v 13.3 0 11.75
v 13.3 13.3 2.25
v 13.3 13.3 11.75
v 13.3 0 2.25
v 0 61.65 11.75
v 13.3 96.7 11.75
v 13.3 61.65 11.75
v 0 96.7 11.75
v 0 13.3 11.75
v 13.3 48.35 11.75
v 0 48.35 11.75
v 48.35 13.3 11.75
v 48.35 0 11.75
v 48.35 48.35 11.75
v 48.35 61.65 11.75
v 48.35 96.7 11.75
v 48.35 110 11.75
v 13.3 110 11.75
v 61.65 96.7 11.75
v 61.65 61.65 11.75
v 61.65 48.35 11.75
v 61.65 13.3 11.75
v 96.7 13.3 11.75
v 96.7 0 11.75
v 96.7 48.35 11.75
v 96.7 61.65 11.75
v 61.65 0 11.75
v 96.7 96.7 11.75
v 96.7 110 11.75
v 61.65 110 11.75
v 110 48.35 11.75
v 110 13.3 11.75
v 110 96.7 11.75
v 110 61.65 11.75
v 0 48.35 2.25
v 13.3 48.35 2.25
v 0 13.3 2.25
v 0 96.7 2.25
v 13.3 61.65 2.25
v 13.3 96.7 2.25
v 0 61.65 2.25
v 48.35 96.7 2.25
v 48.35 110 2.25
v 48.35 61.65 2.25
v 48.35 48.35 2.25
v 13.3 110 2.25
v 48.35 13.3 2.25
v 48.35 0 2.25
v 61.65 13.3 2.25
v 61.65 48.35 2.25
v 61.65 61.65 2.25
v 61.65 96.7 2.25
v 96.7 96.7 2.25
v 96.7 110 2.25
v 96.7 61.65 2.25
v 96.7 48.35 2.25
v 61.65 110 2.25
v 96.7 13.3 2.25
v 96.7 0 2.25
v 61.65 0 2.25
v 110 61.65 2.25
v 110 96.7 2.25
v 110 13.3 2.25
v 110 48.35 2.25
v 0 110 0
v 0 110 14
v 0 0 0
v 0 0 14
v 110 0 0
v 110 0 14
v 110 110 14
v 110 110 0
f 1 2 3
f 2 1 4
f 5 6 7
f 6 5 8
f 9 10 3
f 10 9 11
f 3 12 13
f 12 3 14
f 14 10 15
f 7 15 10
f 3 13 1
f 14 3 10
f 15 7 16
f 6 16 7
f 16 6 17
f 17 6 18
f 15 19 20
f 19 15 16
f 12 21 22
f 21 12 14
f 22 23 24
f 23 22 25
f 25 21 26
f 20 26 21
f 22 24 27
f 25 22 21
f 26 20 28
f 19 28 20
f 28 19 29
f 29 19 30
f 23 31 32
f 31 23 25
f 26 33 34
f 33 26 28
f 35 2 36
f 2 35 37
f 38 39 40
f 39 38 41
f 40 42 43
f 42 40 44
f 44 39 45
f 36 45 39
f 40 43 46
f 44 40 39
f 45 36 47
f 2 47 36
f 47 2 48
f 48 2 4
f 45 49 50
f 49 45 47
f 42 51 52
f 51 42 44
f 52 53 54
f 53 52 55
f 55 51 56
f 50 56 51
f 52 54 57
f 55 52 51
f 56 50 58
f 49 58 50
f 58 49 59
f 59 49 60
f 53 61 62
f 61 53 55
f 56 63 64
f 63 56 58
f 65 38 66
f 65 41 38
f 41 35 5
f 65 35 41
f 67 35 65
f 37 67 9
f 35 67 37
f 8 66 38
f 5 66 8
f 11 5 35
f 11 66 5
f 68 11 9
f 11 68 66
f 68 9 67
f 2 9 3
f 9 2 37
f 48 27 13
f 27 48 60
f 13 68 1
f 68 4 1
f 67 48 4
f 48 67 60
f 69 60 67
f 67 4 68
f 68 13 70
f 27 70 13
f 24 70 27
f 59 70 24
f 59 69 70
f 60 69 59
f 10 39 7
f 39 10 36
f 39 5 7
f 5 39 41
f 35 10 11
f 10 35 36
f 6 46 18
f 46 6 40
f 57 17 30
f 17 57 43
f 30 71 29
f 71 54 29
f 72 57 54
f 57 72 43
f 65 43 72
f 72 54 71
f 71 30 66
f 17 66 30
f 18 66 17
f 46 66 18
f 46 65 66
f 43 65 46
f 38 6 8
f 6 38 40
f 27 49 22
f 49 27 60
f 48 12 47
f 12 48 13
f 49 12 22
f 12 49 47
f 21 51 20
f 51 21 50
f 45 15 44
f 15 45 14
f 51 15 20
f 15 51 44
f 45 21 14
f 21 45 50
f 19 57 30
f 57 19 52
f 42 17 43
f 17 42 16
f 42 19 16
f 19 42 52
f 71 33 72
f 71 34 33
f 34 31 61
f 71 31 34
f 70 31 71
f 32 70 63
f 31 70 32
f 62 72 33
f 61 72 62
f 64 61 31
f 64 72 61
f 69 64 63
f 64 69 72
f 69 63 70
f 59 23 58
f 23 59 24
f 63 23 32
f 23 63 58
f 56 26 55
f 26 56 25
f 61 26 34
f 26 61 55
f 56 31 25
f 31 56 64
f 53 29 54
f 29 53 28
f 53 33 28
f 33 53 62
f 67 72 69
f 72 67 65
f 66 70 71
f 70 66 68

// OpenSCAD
// 미니어처 T-11 파렛트 — 실물 치수 1/10 (faithful scale)
// 포크가 1/10 실물 파렛트 기준으로 설계됨 → 실물을 그대로 축소.
// 단위 mm. OpenSCAD F6(렌더) 후 F7(Export STL).
//
// ✅ 2026-07-29 실측 반영. 이전 기본값(높이 120·블록 140)은 미검증 표준 근사치였고
//    실물과 달랐다 — 그대로 재출력하면 개구부가 7.6mm로 나와 실물(9.5mm)과 어긋난다.

k = 10;   // 축척비

/* ===== 실물 파렛트 치수(mm) — 2026-07-29 실측 반영 ===== */
R_foot_x   = 1100;   // 가로
R_foot_y   = 1100;   // 세로
R_height   = 140;    // 전체 높이 (미니 14mm 실측)
R_top_deck = 22.5;   // 상판 두께  ┐ 합 45mm는 (높이 140 − 개구 95)에서 역산.
R_bot_deck = 22.5;   // 하판 두께  ┘ 상·하 분배는 실측하지 않아 균등 가정.
R_block    = 133;    // 다리 블록 한 변 — 개구 폭 35mm·중심 간격 48.3mm에서 역산(직접 실측 아님)
/* ===================================================== */

/* ===== 미니어처 지게차 포크 실측(mm) — fit 검증용 ===== */
F_thick = 5;      // 포크 수직 두께(뿌리) → 통로 높이가 이보다 커야 함
                  // ⚠️ 실물 포크는 끝으로 갈수록 얇아지는 테이퍼다. 이 모델엔 반영돼 있지 않아
                  //    진입 초기의 실제 여유는 도면보다 넉넉하다(오픈루프 진입의 근거).
F_width = 12;     // 포크 너비       → 통로 폭이 이보다 커야 함
F_gap   = 40;     // 두 포크 사이 최대 간격(0~40 가변)
/* ==================================================== */

// --- /10 환산 (미니어처) ---
foot_x = R_foot_x  / k;
foot_y = R_foot_y  / k;
height = R_height  / k;
topd   = R_top_deck/ k;
botd   = R_bot_deck/ k;
blk    = R_block   / k;
open_h = height - topd - botd;        // 포크 통로(구멍) 높이  ← 이게 포크 두께보다 커야 함

module deck(z, t) translate([0,0,z]) cube([foot_x, foot_y, t]);
module blocks(z)                       // 3x3 다리 → 4방향 포크 진입
  for (x = [0, foot_x/2 - blk/2, foot_x - blk])
    for (y = [0, foot_y/2 - blk/2, foot_y - blk])
      translate([x, y, z]) cube([blk, blk, open_h]);

if (botd > 0) deck(0, botd);           // 하판
blocks(botd);                          // 다리
deck(botd + open_h, topd);             // 상판

// --- fit 검증 (콘솔에 출력) ---
chan_w  = (foot_x - 3*blk) / 2;        // 포크 통로 폭
chan_sp = (foot_x - blk) / 2;          // 두 통로 중심 간격
fork_cc_max = F_gap + F_width;         // 포크 최대 중심거리 (간격 0 → 최소 = F_width)
echo(str("미니 파렛트: ", foot_x, "x", foot_y, "x", height, "mm"));
echo(str("통로 높이 open_h = ", open_h, "mm  vs  포크두께 ", F_thick,
         "mm  → ", open_h > F_thick ? "OK" : "!! 안 들어감"));
echo(str("통로 폭 chan_w = ", chan_w, "mm  vs  포크너비 ", F_width,
         "mm  → ", chan_w > F_width ? "OK" : "!! 안 들어감"));
echo(str("통로 중심간격 = ", chan_sp, "mm  vs  포크 중심거리 ", F_width, "~", fork_cc_max,
         "mm  → ", (chan_sp >= F_width && chan_sp <= fork_cc_max) ? "OK" : "!! 간격 조정 필요"));
